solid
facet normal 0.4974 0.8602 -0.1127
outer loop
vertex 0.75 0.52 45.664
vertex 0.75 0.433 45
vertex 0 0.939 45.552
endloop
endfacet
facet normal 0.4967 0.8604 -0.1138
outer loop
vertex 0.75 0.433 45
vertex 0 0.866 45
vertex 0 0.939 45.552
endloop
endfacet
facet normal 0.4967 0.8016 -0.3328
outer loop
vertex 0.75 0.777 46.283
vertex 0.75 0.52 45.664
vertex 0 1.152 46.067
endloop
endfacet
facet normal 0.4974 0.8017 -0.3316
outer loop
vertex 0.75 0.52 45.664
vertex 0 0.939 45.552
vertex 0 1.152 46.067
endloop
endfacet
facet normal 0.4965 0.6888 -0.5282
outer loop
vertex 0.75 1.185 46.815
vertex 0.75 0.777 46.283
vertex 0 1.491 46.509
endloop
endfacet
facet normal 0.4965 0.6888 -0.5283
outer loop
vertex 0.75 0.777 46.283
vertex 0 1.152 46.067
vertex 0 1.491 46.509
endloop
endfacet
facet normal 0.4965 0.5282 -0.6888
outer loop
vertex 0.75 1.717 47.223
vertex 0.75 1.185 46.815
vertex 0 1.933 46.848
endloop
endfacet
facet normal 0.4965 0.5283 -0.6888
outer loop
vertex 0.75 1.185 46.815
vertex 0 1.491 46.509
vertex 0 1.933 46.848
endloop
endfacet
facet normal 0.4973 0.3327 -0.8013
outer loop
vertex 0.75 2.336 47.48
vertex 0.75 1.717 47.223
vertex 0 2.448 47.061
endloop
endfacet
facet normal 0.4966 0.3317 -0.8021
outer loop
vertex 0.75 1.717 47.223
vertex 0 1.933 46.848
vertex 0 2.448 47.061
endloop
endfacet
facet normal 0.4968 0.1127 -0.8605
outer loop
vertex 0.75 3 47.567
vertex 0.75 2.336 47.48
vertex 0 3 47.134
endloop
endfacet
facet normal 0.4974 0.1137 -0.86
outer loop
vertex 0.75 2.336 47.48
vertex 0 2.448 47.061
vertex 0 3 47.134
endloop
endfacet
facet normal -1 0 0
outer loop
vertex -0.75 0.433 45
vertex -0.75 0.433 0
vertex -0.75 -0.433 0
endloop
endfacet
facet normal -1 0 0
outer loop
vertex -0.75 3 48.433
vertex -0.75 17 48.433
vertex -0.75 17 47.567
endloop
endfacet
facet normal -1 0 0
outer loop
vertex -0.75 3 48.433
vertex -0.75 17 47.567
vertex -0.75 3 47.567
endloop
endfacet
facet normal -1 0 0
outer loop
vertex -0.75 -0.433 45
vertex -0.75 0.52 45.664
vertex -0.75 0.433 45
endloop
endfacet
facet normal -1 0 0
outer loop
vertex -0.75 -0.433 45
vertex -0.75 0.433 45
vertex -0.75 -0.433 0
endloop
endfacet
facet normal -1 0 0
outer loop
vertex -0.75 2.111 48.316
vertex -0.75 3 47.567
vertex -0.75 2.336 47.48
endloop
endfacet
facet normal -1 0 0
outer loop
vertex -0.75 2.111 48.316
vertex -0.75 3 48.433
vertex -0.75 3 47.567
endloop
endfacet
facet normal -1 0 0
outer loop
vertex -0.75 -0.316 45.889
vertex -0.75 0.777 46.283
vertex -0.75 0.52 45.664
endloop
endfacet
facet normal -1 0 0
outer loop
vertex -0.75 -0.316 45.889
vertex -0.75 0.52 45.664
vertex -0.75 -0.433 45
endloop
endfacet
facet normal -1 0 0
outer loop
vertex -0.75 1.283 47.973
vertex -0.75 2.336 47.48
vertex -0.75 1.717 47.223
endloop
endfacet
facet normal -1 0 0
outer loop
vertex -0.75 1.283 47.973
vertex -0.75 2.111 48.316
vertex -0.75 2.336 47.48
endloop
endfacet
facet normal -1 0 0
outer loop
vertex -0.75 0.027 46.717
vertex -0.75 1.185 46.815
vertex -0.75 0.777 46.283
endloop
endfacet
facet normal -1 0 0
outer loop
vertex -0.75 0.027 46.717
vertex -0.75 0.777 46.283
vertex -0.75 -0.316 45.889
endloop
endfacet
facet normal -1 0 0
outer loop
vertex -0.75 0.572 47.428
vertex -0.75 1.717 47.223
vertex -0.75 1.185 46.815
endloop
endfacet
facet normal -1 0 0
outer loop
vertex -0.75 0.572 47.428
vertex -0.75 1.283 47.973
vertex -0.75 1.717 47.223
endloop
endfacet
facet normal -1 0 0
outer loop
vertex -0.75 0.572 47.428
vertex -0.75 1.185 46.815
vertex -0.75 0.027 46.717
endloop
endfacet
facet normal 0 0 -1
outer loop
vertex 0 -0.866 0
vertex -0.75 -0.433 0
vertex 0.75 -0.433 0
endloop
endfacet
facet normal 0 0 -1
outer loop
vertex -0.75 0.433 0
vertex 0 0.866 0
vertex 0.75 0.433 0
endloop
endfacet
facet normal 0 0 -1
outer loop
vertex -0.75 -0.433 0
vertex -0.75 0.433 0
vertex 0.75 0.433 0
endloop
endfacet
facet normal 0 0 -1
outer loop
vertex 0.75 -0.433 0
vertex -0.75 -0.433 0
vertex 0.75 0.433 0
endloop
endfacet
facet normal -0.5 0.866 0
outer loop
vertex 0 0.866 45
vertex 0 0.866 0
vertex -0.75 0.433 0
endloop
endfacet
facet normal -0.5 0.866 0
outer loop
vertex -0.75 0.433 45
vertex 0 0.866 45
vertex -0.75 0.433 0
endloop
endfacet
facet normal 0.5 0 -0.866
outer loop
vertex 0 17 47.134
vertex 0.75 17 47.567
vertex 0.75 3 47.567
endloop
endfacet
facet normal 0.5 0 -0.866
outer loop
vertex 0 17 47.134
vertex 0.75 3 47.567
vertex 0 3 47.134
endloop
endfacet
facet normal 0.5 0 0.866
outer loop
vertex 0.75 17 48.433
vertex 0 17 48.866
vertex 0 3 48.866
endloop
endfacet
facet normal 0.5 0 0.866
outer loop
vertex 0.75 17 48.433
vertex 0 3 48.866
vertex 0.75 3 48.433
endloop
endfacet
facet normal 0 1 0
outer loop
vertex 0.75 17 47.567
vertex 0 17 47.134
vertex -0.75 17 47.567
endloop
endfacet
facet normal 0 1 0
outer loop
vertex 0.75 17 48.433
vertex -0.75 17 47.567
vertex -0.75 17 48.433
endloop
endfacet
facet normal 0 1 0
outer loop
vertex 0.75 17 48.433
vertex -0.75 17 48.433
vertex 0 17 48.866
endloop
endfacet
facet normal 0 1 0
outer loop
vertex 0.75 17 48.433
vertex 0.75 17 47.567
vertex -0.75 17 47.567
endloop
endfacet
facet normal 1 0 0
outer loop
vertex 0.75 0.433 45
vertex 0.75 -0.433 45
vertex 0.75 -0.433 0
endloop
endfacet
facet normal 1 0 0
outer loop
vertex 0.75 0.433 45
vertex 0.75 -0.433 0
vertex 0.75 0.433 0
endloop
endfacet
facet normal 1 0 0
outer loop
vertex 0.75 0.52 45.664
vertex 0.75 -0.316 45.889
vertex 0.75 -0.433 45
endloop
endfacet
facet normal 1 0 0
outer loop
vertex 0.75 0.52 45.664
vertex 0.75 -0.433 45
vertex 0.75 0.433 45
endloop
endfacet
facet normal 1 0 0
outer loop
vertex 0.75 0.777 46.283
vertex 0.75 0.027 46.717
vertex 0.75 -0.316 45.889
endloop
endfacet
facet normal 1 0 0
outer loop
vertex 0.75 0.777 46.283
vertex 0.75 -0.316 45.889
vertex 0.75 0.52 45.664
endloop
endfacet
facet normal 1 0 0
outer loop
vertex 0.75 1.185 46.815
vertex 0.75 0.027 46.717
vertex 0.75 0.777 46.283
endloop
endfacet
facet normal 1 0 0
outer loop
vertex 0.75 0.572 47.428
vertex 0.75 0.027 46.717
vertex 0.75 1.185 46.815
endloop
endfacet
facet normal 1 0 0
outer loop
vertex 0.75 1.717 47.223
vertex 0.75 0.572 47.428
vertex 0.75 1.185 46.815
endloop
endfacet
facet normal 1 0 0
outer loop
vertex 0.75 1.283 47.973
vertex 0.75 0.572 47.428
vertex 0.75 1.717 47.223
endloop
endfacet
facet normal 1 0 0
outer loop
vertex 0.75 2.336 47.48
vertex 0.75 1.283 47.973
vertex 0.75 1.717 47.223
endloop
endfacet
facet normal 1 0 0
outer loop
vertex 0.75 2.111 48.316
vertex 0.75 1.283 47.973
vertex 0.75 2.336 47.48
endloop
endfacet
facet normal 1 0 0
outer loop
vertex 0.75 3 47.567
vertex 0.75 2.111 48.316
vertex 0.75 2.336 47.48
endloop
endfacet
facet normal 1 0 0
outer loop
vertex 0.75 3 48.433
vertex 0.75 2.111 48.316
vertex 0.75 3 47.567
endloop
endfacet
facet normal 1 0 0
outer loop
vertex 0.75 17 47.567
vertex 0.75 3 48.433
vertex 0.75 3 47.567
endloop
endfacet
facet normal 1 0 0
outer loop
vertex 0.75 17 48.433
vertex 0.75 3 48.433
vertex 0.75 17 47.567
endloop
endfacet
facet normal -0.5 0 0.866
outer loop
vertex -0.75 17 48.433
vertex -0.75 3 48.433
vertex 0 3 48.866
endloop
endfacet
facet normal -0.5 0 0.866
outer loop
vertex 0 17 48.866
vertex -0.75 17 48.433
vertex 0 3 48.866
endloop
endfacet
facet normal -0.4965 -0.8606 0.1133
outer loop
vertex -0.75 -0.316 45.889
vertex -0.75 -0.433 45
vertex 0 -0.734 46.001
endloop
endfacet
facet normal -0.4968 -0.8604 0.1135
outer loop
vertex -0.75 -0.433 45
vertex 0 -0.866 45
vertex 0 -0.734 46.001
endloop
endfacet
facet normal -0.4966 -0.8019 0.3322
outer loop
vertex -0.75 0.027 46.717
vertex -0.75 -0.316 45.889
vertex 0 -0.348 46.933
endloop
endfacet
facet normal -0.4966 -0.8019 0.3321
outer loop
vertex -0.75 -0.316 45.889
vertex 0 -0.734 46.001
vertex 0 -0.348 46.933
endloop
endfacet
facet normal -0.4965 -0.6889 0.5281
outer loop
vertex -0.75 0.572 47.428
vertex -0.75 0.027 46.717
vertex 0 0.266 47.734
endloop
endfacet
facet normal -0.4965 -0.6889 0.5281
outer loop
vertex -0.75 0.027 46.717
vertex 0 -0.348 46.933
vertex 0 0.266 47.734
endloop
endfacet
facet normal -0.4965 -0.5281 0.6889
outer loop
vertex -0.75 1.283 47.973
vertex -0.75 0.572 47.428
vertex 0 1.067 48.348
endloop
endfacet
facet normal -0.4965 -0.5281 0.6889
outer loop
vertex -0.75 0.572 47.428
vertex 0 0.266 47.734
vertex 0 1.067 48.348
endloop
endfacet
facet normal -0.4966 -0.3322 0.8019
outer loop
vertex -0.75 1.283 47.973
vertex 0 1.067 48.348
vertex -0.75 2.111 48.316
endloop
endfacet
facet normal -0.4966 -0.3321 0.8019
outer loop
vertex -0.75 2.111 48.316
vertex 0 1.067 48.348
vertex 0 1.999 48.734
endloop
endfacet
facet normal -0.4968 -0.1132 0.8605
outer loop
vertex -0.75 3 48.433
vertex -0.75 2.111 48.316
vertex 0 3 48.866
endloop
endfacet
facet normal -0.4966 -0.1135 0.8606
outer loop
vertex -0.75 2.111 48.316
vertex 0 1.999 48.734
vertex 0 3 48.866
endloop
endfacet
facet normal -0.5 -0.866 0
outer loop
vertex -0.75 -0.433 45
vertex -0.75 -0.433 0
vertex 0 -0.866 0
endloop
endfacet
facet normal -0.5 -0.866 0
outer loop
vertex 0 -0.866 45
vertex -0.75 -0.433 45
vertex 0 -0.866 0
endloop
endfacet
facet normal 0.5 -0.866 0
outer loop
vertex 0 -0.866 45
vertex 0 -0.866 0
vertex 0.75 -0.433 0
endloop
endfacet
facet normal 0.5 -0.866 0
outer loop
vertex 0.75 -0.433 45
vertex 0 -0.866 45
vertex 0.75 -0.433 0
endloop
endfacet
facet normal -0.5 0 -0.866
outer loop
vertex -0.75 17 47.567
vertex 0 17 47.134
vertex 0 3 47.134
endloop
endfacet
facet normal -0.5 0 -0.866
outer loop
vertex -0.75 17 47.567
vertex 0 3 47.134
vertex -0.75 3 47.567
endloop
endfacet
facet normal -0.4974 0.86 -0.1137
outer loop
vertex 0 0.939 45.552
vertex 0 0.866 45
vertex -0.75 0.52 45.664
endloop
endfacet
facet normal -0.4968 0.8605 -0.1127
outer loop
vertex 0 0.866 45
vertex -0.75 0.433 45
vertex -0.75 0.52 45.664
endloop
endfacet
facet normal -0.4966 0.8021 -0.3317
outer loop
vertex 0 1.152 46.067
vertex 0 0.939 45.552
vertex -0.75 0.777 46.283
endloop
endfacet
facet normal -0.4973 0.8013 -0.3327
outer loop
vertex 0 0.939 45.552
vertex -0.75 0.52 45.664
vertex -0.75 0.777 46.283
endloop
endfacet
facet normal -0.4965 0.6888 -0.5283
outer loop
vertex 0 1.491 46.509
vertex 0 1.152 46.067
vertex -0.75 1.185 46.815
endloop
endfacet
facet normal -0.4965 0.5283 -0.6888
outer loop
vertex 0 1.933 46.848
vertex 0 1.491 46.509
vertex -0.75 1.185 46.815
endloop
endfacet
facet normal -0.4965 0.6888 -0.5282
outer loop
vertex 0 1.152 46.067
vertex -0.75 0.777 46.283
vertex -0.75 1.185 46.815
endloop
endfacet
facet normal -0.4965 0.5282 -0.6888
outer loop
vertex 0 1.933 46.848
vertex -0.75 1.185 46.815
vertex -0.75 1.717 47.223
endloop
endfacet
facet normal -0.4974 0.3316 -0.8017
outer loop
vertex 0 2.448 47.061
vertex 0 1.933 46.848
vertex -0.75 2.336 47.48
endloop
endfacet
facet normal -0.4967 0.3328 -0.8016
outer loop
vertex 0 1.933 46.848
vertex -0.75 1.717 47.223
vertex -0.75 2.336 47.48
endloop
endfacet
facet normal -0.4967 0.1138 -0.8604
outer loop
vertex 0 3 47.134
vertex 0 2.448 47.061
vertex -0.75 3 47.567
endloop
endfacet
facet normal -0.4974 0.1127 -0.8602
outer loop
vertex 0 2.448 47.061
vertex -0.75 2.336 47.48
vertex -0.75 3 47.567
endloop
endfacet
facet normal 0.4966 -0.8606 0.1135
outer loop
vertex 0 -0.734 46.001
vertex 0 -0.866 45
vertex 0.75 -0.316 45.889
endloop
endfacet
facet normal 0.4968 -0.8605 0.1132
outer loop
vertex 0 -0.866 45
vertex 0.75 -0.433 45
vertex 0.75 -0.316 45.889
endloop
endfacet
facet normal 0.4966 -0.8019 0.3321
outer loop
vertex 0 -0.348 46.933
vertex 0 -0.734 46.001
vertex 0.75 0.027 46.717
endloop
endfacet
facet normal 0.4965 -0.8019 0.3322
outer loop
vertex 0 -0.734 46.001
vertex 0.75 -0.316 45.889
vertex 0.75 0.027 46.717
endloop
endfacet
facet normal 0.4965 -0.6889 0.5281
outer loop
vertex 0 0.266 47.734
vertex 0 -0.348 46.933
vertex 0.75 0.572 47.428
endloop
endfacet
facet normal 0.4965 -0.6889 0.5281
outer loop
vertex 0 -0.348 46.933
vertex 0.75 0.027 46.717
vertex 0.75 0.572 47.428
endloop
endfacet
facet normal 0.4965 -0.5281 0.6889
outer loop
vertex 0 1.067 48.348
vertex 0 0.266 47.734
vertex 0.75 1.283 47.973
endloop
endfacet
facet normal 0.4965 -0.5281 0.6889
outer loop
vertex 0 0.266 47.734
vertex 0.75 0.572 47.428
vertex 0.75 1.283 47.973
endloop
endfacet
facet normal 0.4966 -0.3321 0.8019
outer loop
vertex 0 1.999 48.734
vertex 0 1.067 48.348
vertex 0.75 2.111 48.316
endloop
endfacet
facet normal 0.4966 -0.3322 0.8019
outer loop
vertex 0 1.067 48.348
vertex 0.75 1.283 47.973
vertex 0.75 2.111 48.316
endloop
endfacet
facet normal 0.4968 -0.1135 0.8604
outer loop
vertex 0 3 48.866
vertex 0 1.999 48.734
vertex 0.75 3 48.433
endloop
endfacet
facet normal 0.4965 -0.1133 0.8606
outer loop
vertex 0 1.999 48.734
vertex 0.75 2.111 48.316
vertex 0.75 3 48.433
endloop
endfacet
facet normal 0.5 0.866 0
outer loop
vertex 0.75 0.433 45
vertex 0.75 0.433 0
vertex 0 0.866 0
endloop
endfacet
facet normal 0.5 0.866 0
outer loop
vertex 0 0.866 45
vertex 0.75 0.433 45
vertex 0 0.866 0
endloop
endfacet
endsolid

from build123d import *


with BuildPart() as part:
    # Sweep1: sweep along a curve in space
    with BuildLine() as sweep1_path:
        Line((0, 0, 0), (0, 0, 45))
        ThreePointArc((0, 3, 48), (0, 0.878679656, 47.121320344), (0, 0, 45))
        Line((0, 3, 48), (0, 17, 48))
    # Sketch1 → Sweep1 (sweep)
    with BuildSketch(Plane(origin=(0, 0, 0), x_dir=(0, 1, 0), z_dir=(0, 0, 1))):
        Polygon((0.866025404, 0), (0.433012702, 0.75), (-0.433012702, 0.75), (-0.866025404, 0), (-0.433012702, -0.75), (0.433012702, -0.75), align=None)
    sweep(path=sweep1_path.line)


solid = part.part
